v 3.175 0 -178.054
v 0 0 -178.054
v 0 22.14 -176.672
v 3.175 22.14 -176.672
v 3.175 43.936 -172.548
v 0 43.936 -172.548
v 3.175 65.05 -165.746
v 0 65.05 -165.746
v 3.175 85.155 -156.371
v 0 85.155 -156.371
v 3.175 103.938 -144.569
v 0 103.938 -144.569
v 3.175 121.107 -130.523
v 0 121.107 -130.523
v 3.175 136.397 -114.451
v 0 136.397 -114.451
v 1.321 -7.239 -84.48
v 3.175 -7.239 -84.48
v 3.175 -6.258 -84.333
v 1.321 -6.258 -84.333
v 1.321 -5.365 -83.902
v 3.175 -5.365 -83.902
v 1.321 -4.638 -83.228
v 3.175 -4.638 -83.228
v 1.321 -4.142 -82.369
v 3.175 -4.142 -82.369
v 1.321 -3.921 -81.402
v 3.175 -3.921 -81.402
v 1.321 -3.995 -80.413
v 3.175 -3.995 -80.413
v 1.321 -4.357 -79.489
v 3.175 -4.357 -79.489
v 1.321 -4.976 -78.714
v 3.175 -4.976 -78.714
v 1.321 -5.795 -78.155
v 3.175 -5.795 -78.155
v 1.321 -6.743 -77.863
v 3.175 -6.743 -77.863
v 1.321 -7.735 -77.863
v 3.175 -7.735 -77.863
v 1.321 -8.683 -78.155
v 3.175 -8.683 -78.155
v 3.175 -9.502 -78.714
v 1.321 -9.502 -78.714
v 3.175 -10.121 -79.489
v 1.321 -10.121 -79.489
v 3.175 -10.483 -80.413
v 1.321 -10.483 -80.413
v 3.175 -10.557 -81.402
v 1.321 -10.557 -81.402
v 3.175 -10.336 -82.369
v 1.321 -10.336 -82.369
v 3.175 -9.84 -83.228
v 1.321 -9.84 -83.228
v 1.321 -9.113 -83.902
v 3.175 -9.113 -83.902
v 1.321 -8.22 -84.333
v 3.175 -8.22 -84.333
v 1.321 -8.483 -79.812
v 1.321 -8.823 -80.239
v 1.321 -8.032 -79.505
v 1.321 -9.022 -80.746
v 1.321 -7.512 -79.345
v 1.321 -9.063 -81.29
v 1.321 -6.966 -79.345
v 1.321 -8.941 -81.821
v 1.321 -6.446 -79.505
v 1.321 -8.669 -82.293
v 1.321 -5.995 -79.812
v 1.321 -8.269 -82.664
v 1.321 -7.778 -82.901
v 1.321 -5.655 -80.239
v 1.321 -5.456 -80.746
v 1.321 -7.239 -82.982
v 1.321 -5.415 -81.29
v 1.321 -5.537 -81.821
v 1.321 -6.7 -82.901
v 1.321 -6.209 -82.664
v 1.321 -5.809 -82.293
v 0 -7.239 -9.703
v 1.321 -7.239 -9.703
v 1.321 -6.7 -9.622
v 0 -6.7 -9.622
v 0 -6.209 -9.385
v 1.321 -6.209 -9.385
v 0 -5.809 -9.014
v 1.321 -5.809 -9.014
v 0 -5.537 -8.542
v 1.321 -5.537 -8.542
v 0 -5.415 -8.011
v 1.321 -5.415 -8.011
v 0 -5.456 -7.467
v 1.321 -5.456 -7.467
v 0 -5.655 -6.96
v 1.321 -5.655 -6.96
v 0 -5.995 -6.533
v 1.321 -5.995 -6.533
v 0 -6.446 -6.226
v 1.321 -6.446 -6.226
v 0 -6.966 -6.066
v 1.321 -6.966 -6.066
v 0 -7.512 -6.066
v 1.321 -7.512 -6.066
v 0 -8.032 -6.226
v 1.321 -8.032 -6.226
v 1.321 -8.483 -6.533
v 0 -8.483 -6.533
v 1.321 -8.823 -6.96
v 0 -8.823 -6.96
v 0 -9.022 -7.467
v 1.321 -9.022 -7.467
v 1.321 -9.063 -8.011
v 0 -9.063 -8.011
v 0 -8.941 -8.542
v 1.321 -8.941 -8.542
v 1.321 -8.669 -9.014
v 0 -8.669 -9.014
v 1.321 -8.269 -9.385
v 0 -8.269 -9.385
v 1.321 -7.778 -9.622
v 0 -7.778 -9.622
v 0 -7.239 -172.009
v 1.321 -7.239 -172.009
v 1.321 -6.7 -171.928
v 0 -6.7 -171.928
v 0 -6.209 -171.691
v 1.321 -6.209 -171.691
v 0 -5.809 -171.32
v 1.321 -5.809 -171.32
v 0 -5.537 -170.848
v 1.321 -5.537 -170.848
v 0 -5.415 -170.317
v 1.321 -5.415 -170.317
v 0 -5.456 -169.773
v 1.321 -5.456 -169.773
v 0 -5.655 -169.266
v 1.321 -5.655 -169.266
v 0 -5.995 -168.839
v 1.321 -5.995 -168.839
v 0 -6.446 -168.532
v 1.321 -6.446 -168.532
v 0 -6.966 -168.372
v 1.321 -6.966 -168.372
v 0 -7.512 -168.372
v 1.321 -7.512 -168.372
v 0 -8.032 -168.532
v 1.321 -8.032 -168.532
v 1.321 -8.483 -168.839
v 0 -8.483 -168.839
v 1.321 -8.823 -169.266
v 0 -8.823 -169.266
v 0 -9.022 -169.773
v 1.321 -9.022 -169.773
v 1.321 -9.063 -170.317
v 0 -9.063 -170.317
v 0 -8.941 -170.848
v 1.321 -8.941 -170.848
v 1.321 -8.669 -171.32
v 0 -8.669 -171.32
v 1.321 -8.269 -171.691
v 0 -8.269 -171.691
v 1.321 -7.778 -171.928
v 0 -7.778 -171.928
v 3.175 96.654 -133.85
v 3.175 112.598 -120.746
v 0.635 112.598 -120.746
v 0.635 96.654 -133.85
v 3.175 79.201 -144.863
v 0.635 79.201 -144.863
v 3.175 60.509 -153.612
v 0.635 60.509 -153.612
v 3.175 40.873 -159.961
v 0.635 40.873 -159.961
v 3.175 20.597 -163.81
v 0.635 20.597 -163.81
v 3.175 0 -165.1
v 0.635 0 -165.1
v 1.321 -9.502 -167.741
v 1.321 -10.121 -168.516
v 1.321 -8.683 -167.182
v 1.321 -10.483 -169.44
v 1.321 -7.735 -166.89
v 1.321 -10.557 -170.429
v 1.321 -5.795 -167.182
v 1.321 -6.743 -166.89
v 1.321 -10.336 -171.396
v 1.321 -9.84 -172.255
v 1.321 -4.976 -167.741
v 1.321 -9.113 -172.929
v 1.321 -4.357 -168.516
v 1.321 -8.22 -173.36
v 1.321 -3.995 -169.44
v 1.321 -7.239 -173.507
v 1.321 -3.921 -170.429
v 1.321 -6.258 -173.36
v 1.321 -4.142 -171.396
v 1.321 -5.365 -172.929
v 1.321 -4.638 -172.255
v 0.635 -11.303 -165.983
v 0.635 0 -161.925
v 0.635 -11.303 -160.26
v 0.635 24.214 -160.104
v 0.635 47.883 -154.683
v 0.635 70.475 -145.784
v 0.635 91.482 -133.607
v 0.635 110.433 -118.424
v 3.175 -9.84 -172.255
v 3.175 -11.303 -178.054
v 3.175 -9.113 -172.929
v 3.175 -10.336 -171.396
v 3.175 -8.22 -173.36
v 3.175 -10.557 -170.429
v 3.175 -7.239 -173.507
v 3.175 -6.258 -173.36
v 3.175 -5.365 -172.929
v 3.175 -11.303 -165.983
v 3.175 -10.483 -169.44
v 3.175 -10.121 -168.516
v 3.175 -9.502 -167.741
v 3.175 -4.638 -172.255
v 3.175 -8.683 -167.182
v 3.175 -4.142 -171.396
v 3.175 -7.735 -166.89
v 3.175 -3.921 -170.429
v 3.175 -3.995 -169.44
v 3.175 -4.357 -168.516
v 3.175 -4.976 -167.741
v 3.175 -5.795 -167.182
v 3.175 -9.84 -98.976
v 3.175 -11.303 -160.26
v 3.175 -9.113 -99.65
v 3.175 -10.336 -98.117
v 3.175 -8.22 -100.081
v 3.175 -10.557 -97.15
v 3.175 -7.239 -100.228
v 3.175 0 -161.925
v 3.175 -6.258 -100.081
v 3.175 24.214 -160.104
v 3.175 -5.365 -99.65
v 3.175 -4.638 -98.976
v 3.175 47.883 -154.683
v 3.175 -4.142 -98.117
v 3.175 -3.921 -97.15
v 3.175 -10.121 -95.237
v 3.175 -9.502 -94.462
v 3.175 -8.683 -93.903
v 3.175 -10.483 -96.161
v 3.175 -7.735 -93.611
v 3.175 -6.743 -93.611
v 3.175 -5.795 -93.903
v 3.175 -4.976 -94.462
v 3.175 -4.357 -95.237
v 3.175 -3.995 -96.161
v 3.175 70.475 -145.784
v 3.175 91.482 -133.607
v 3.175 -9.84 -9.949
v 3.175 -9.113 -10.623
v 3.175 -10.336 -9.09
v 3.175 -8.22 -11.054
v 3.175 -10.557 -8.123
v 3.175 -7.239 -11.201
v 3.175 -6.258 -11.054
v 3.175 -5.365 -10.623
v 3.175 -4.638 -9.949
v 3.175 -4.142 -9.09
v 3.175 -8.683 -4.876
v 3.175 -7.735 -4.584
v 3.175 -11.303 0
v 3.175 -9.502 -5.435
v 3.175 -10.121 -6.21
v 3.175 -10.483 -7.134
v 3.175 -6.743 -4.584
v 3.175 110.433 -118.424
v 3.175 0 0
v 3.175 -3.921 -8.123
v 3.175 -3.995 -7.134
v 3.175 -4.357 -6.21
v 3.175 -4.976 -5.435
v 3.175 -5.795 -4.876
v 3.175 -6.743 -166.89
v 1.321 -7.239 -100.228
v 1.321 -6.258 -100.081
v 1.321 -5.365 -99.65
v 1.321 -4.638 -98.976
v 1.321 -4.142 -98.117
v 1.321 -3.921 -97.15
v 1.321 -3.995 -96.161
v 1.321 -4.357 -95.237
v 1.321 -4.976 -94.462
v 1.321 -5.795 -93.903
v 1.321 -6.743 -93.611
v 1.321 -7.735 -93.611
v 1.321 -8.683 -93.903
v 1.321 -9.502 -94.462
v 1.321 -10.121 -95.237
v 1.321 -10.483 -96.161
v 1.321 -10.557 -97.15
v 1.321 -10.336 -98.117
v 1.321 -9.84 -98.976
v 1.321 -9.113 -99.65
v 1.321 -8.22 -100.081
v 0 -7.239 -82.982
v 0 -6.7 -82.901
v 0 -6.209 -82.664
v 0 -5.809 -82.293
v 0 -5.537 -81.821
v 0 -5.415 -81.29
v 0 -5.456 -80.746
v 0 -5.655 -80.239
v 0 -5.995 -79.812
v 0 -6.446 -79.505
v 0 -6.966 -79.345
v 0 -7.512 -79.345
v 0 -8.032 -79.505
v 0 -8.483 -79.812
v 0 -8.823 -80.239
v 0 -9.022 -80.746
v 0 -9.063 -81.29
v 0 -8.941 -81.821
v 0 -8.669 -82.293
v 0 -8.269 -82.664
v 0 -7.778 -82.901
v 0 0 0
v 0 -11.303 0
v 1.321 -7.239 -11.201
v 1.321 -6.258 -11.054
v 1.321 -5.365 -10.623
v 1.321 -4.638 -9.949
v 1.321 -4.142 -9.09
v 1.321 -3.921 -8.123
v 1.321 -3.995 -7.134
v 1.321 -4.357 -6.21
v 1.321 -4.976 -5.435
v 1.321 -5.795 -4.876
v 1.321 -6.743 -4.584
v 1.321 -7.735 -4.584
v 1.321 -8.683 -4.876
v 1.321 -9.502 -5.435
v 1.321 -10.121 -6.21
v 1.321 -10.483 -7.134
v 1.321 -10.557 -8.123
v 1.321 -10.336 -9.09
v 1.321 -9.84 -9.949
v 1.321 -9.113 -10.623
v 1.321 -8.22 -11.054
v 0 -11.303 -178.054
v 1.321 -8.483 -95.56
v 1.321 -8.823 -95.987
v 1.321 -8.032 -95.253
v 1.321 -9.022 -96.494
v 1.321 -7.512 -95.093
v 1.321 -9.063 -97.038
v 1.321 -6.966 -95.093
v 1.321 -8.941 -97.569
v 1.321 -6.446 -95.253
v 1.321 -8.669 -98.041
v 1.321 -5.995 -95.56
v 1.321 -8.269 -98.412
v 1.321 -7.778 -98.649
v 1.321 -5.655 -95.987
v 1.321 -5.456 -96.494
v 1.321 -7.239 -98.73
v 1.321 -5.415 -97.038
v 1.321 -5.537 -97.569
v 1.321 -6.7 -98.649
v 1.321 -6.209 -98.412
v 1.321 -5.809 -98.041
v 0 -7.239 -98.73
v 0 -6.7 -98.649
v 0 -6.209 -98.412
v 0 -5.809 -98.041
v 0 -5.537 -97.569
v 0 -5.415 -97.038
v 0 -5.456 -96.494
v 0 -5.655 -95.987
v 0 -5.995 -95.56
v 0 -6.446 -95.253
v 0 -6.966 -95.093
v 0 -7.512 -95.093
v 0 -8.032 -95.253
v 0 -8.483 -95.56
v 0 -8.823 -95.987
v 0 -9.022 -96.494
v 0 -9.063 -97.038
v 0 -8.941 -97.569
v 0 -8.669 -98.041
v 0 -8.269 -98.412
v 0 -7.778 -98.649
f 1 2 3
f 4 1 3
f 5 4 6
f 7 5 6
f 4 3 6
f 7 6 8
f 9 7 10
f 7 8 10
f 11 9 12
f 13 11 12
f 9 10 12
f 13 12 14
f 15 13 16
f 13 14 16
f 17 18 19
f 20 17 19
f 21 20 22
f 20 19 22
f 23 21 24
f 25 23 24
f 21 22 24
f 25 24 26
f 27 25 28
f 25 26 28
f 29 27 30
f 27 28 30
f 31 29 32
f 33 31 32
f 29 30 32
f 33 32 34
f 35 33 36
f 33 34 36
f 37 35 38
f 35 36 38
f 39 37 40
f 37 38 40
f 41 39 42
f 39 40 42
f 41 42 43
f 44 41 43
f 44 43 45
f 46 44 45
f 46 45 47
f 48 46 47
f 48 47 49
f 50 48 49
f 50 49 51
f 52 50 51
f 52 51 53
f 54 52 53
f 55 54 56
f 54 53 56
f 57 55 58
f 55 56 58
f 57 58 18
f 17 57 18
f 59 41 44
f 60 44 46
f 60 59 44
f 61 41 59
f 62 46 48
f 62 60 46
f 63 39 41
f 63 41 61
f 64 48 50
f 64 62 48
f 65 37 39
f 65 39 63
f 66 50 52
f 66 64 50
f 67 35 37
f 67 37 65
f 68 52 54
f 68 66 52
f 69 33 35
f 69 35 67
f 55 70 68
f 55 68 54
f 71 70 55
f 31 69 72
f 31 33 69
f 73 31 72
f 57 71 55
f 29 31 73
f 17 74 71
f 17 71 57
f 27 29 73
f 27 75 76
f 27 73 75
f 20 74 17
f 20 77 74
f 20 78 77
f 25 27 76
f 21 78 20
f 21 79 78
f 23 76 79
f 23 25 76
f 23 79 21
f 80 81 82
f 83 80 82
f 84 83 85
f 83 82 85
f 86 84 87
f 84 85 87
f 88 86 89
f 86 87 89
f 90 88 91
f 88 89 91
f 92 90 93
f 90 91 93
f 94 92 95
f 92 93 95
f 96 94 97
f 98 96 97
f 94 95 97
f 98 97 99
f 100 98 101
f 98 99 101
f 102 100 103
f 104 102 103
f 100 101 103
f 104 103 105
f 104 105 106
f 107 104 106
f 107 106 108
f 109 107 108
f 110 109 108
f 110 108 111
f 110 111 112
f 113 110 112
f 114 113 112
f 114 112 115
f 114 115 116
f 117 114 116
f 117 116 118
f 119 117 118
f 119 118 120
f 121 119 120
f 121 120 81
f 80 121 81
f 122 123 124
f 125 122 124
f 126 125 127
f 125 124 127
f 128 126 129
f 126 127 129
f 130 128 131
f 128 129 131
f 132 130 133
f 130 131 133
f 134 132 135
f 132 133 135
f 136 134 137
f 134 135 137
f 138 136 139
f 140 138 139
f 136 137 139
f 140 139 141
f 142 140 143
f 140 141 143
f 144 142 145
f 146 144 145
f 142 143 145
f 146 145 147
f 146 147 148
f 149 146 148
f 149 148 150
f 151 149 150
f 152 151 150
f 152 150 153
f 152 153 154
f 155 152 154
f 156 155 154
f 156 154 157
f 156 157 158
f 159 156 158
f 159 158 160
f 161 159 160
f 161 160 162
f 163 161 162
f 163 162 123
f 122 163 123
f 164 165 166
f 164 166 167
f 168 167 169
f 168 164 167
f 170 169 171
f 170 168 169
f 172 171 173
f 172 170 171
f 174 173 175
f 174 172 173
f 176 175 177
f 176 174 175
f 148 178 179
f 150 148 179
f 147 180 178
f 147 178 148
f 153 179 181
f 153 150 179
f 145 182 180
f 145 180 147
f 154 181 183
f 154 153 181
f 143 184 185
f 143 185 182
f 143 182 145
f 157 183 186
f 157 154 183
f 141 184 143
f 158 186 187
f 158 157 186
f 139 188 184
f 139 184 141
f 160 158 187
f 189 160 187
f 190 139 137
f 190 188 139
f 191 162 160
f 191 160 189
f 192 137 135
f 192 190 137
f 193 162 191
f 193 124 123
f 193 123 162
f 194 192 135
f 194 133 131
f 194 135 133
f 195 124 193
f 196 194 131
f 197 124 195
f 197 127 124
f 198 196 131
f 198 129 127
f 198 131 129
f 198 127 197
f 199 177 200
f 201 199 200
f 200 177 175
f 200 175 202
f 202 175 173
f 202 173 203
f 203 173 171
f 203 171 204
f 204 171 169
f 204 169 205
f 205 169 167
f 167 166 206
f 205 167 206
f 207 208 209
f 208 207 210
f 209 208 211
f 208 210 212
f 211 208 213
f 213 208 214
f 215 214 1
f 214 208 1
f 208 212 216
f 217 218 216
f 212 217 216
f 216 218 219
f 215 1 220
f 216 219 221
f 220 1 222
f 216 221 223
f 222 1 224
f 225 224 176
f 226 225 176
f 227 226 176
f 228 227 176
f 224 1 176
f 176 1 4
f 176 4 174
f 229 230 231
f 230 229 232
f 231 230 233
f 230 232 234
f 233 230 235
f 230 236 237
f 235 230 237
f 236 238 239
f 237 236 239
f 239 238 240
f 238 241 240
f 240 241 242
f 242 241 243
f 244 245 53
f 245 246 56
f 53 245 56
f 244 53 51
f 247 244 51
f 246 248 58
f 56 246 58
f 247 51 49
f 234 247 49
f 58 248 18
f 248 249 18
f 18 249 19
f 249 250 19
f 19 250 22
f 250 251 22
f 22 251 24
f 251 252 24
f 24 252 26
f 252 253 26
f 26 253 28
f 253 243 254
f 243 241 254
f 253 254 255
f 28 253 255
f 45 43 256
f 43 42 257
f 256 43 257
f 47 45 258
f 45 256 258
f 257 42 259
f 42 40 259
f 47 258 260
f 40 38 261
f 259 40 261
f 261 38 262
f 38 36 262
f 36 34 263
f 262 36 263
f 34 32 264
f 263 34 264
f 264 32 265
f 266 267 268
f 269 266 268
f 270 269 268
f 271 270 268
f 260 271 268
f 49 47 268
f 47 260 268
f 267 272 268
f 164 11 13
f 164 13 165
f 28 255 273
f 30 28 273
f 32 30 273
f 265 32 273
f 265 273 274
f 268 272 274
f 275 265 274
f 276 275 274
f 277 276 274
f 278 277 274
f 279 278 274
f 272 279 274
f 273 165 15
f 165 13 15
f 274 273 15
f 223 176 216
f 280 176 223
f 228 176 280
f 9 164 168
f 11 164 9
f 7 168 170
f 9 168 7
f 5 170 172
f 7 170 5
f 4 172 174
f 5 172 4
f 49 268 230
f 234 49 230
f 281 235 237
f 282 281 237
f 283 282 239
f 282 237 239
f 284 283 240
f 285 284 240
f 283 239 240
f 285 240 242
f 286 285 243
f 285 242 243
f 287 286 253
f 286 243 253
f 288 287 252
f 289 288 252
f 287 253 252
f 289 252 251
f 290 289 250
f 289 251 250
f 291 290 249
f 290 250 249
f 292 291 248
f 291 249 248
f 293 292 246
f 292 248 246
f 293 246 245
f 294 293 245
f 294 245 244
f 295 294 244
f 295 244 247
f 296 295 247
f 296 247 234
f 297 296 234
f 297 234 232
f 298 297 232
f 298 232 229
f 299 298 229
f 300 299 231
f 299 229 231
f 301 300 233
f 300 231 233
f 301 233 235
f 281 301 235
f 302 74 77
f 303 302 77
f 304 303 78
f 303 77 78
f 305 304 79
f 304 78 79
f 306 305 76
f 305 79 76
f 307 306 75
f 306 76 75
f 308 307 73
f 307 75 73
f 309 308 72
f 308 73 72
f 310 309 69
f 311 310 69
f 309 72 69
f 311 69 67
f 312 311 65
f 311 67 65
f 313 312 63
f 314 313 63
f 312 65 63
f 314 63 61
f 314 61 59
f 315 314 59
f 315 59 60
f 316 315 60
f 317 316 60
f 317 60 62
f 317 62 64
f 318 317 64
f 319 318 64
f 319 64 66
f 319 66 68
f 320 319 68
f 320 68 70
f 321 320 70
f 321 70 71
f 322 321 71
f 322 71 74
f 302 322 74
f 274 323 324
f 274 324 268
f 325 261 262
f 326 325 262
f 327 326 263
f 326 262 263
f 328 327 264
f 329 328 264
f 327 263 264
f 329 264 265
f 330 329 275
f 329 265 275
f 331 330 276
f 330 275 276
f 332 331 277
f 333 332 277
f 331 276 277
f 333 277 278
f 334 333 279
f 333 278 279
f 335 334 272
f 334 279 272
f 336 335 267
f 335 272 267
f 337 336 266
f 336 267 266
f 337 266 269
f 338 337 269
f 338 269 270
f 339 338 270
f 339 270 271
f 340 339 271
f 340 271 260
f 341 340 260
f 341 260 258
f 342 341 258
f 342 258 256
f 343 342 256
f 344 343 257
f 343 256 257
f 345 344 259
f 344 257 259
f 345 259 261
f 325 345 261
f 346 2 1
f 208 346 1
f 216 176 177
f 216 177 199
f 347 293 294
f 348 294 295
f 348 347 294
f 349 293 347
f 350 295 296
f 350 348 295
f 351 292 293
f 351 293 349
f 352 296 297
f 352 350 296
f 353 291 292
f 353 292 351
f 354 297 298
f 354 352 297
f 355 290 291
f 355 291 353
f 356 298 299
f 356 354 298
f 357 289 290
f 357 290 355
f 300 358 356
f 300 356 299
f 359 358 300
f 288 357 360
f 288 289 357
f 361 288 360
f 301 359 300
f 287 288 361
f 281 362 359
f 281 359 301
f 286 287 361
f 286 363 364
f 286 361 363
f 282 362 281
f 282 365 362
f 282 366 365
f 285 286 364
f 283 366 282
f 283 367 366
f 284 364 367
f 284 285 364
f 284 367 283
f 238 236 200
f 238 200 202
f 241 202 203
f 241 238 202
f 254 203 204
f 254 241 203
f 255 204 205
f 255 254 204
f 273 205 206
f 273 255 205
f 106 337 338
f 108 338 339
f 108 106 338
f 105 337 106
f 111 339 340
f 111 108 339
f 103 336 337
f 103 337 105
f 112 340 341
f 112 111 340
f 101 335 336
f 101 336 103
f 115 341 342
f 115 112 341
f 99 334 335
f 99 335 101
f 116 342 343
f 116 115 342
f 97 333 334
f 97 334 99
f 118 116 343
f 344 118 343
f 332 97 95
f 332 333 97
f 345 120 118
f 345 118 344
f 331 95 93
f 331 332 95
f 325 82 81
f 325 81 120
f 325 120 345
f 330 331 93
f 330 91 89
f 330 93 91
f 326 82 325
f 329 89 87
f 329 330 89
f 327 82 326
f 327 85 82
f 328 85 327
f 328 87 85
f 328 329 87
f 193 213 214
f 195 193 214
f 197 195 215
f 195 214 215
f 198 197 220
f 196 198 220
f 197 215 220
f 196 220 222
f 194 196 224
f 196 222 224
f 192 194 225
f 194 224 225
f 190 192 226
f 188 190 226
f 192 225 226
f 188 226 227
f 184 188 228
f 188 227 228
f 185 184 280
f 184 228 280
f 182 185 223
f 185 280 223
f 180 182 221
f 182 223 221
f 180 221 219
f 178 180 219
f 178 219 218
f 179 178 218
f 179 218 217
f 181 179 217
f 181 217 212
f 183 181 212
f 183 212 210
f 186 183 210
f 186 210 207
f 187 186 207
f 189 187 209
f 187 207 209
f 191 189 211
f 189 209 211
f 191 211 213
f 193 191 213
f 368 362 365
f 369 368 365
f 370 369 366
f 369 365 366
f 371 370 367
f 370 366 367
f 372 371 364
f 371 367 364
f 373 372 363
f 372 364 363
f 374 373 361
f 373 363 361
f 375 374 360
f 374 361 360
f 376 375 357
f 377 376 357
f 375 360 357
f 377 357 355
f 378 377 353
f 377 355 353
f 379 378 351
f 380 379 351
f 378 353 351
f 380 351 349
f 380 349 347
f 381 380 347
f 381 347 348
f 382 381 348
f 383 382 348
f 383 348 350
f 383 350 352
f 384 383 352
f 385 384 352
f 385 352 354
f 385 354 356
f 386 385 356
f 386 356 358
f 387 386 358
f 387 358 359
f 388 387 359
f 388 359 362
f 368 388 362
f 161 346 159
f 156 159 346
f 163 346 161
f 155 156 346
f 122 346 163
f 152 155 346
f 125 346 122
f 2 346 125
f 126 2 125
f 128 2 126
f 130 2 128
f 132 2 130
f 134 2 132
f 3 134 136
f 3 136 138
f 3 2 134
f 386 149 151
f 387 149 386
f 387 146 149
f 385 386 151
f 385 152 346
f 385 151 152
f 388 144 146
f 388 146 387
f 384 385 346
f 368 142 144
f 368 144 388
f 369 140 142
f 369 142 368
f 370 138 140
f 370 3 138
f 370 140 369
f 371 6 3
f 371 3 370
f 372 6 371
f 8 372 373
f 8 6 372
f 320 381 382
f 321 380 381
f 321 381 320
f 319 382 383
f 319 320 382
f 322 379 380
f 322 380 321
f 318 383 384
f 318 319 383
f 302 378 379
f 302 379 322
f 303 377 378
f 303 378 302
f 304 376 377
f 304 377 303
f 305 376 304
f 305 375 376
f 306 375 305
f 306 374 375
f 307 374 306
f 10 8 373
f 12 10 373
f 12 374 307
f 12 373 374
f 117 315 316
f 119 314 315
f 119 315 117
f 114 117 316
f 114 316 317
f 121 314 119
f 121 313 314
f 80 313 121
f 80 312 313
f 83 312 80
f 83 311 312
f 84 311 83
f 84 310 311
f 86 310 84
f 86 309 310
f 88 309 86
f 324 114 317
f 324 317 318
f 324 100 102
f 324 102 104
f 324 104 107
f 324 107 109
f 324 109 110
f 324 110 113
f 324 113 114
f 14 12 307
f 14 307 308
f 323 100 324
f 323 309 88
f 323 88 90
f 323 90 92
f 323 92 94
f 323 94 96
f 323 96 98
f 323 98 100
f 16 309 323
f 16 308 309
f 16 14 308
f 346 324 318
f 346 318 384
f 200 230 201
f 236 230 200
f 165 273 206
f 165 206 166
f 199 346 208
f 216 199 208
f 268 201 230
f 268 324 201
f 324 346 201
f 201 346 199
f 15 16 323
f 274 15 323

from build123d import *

# Parameters (mm, degrees)
BOSS_EXTRUDE1_DEPTH = 3.175
SKETCH2_W           = 3.175
SKETCH2_H           = 178.054
BOSS_EXTRUDE2_DEPTH = 11.303
SKETCH3_R           = 1.8288
CUT_EXTRUDE1_DEPTH  = 4.175
CUT_EXTRUDE2_DEPTH  = 2.54
SKETCH8_R           = 3.3274
CUT_EXTRUDE3_DEPTH  = 1.8542


with BuildPart() as part:
    # Sketch1 → Boss-Extrude1 (new body)
    with BuildSketch(Plane(origin=(0, 0, 0), x_dir=(0, 0, -1), z_dir=(1, 0, 0))):
        with BuildLine():
            Line((0, 0), (178.054, 0))
            ThreePointArc((178.054, 0), (161.371726713, 75.248871976), (114.450905055, 136.397277275))
            Line((114.450905055, 136.397277275), (0, 0))
        make_face()
    extrude(amount=BOSS_EXTRUDE1_DEPTH)

    # Sketch2 → Boss-Extrude2 (add)
    with BuildSketch(Plane.XZ):
        with Locations((1.5875, -89.027)):
            Rectangle(SKETCH2_W, SKETCH2_H)
    extrude(amount=BOSS_EXTRUDE2_DEPTH)

    # Sketch3 → Cut-Extrude1 (cut, through all)
    with BuildSketch(Plane(origin=(3.175, 0, 0), x_dir=(0, 0, -1), z_dir=(1, 0, 0))):
        with Locations((7.874, -7.239)):
            Circle(SKETCH3_R)
        with Locations((81.153, -7.239)):
            Circle(SKETCH3_R)
        with Locations((96.901, -7.239)):
            Circle(SKETCH3_R)
        with Locations((170.18, -7.239)):
            Circle(SKETCH3_R)
    extrude(amount=-CUT_EXTRUDE1_DEPTH, mode=Mode.SUBTRACT)

    # Sketch6 → Cut-Extrude2 (cut)
    with BuildSketch(Plane(origin=(3.175, 0, 0), x_dir=(0, 0, -1), z_dir=(1, 0, 0))):
        with BuildLine():
            Line((165.1, 0), (165.982635189, -11.303))
            Line((165.982635189, -11.303), (160.260021408, -11.303))
            Line((160.260021408, -11.303), (161.925, 0))
            ThreePointArc((161.925, 0), (150.657864695, 59.345711137), (118.424448135, 110.432584453))
            Line((118.424448135, 110.432584453), (120.746496137, 112.597929246))
            ThreePointArc((120.746496137, 112.597929246), (153.611940474, 60.509352532), (165.1, 0))
        make_face()
    extrude(amount=-CUT_EXTRUDE2_DEPTH, mode=Mode.SUBTRACT)

    # Sketch8 → Cut-Extrude3 (cut)
    with BuildSketch(Plane(origin=(3.175, 0, 0), x_dir=(0, 0, -1), z_dir=(1, 0, 0))):
        with Locations((7.874, -7.239)):
            Circle(SKETCH8_R)
        with Locations((81.153, -7.239)):
            Circle(SKETCH8_R)
        with Locations((96.901, -7.239)):
            Circle(SKETCH8_R)
        with Locations((170.18, -7.239)):
            Circle(SKETCH8_R)
    extrude(amount=-CUT_EXTRUDE3_DEPTH, mode=Mode.SUBTRACT)


solid = part.part
